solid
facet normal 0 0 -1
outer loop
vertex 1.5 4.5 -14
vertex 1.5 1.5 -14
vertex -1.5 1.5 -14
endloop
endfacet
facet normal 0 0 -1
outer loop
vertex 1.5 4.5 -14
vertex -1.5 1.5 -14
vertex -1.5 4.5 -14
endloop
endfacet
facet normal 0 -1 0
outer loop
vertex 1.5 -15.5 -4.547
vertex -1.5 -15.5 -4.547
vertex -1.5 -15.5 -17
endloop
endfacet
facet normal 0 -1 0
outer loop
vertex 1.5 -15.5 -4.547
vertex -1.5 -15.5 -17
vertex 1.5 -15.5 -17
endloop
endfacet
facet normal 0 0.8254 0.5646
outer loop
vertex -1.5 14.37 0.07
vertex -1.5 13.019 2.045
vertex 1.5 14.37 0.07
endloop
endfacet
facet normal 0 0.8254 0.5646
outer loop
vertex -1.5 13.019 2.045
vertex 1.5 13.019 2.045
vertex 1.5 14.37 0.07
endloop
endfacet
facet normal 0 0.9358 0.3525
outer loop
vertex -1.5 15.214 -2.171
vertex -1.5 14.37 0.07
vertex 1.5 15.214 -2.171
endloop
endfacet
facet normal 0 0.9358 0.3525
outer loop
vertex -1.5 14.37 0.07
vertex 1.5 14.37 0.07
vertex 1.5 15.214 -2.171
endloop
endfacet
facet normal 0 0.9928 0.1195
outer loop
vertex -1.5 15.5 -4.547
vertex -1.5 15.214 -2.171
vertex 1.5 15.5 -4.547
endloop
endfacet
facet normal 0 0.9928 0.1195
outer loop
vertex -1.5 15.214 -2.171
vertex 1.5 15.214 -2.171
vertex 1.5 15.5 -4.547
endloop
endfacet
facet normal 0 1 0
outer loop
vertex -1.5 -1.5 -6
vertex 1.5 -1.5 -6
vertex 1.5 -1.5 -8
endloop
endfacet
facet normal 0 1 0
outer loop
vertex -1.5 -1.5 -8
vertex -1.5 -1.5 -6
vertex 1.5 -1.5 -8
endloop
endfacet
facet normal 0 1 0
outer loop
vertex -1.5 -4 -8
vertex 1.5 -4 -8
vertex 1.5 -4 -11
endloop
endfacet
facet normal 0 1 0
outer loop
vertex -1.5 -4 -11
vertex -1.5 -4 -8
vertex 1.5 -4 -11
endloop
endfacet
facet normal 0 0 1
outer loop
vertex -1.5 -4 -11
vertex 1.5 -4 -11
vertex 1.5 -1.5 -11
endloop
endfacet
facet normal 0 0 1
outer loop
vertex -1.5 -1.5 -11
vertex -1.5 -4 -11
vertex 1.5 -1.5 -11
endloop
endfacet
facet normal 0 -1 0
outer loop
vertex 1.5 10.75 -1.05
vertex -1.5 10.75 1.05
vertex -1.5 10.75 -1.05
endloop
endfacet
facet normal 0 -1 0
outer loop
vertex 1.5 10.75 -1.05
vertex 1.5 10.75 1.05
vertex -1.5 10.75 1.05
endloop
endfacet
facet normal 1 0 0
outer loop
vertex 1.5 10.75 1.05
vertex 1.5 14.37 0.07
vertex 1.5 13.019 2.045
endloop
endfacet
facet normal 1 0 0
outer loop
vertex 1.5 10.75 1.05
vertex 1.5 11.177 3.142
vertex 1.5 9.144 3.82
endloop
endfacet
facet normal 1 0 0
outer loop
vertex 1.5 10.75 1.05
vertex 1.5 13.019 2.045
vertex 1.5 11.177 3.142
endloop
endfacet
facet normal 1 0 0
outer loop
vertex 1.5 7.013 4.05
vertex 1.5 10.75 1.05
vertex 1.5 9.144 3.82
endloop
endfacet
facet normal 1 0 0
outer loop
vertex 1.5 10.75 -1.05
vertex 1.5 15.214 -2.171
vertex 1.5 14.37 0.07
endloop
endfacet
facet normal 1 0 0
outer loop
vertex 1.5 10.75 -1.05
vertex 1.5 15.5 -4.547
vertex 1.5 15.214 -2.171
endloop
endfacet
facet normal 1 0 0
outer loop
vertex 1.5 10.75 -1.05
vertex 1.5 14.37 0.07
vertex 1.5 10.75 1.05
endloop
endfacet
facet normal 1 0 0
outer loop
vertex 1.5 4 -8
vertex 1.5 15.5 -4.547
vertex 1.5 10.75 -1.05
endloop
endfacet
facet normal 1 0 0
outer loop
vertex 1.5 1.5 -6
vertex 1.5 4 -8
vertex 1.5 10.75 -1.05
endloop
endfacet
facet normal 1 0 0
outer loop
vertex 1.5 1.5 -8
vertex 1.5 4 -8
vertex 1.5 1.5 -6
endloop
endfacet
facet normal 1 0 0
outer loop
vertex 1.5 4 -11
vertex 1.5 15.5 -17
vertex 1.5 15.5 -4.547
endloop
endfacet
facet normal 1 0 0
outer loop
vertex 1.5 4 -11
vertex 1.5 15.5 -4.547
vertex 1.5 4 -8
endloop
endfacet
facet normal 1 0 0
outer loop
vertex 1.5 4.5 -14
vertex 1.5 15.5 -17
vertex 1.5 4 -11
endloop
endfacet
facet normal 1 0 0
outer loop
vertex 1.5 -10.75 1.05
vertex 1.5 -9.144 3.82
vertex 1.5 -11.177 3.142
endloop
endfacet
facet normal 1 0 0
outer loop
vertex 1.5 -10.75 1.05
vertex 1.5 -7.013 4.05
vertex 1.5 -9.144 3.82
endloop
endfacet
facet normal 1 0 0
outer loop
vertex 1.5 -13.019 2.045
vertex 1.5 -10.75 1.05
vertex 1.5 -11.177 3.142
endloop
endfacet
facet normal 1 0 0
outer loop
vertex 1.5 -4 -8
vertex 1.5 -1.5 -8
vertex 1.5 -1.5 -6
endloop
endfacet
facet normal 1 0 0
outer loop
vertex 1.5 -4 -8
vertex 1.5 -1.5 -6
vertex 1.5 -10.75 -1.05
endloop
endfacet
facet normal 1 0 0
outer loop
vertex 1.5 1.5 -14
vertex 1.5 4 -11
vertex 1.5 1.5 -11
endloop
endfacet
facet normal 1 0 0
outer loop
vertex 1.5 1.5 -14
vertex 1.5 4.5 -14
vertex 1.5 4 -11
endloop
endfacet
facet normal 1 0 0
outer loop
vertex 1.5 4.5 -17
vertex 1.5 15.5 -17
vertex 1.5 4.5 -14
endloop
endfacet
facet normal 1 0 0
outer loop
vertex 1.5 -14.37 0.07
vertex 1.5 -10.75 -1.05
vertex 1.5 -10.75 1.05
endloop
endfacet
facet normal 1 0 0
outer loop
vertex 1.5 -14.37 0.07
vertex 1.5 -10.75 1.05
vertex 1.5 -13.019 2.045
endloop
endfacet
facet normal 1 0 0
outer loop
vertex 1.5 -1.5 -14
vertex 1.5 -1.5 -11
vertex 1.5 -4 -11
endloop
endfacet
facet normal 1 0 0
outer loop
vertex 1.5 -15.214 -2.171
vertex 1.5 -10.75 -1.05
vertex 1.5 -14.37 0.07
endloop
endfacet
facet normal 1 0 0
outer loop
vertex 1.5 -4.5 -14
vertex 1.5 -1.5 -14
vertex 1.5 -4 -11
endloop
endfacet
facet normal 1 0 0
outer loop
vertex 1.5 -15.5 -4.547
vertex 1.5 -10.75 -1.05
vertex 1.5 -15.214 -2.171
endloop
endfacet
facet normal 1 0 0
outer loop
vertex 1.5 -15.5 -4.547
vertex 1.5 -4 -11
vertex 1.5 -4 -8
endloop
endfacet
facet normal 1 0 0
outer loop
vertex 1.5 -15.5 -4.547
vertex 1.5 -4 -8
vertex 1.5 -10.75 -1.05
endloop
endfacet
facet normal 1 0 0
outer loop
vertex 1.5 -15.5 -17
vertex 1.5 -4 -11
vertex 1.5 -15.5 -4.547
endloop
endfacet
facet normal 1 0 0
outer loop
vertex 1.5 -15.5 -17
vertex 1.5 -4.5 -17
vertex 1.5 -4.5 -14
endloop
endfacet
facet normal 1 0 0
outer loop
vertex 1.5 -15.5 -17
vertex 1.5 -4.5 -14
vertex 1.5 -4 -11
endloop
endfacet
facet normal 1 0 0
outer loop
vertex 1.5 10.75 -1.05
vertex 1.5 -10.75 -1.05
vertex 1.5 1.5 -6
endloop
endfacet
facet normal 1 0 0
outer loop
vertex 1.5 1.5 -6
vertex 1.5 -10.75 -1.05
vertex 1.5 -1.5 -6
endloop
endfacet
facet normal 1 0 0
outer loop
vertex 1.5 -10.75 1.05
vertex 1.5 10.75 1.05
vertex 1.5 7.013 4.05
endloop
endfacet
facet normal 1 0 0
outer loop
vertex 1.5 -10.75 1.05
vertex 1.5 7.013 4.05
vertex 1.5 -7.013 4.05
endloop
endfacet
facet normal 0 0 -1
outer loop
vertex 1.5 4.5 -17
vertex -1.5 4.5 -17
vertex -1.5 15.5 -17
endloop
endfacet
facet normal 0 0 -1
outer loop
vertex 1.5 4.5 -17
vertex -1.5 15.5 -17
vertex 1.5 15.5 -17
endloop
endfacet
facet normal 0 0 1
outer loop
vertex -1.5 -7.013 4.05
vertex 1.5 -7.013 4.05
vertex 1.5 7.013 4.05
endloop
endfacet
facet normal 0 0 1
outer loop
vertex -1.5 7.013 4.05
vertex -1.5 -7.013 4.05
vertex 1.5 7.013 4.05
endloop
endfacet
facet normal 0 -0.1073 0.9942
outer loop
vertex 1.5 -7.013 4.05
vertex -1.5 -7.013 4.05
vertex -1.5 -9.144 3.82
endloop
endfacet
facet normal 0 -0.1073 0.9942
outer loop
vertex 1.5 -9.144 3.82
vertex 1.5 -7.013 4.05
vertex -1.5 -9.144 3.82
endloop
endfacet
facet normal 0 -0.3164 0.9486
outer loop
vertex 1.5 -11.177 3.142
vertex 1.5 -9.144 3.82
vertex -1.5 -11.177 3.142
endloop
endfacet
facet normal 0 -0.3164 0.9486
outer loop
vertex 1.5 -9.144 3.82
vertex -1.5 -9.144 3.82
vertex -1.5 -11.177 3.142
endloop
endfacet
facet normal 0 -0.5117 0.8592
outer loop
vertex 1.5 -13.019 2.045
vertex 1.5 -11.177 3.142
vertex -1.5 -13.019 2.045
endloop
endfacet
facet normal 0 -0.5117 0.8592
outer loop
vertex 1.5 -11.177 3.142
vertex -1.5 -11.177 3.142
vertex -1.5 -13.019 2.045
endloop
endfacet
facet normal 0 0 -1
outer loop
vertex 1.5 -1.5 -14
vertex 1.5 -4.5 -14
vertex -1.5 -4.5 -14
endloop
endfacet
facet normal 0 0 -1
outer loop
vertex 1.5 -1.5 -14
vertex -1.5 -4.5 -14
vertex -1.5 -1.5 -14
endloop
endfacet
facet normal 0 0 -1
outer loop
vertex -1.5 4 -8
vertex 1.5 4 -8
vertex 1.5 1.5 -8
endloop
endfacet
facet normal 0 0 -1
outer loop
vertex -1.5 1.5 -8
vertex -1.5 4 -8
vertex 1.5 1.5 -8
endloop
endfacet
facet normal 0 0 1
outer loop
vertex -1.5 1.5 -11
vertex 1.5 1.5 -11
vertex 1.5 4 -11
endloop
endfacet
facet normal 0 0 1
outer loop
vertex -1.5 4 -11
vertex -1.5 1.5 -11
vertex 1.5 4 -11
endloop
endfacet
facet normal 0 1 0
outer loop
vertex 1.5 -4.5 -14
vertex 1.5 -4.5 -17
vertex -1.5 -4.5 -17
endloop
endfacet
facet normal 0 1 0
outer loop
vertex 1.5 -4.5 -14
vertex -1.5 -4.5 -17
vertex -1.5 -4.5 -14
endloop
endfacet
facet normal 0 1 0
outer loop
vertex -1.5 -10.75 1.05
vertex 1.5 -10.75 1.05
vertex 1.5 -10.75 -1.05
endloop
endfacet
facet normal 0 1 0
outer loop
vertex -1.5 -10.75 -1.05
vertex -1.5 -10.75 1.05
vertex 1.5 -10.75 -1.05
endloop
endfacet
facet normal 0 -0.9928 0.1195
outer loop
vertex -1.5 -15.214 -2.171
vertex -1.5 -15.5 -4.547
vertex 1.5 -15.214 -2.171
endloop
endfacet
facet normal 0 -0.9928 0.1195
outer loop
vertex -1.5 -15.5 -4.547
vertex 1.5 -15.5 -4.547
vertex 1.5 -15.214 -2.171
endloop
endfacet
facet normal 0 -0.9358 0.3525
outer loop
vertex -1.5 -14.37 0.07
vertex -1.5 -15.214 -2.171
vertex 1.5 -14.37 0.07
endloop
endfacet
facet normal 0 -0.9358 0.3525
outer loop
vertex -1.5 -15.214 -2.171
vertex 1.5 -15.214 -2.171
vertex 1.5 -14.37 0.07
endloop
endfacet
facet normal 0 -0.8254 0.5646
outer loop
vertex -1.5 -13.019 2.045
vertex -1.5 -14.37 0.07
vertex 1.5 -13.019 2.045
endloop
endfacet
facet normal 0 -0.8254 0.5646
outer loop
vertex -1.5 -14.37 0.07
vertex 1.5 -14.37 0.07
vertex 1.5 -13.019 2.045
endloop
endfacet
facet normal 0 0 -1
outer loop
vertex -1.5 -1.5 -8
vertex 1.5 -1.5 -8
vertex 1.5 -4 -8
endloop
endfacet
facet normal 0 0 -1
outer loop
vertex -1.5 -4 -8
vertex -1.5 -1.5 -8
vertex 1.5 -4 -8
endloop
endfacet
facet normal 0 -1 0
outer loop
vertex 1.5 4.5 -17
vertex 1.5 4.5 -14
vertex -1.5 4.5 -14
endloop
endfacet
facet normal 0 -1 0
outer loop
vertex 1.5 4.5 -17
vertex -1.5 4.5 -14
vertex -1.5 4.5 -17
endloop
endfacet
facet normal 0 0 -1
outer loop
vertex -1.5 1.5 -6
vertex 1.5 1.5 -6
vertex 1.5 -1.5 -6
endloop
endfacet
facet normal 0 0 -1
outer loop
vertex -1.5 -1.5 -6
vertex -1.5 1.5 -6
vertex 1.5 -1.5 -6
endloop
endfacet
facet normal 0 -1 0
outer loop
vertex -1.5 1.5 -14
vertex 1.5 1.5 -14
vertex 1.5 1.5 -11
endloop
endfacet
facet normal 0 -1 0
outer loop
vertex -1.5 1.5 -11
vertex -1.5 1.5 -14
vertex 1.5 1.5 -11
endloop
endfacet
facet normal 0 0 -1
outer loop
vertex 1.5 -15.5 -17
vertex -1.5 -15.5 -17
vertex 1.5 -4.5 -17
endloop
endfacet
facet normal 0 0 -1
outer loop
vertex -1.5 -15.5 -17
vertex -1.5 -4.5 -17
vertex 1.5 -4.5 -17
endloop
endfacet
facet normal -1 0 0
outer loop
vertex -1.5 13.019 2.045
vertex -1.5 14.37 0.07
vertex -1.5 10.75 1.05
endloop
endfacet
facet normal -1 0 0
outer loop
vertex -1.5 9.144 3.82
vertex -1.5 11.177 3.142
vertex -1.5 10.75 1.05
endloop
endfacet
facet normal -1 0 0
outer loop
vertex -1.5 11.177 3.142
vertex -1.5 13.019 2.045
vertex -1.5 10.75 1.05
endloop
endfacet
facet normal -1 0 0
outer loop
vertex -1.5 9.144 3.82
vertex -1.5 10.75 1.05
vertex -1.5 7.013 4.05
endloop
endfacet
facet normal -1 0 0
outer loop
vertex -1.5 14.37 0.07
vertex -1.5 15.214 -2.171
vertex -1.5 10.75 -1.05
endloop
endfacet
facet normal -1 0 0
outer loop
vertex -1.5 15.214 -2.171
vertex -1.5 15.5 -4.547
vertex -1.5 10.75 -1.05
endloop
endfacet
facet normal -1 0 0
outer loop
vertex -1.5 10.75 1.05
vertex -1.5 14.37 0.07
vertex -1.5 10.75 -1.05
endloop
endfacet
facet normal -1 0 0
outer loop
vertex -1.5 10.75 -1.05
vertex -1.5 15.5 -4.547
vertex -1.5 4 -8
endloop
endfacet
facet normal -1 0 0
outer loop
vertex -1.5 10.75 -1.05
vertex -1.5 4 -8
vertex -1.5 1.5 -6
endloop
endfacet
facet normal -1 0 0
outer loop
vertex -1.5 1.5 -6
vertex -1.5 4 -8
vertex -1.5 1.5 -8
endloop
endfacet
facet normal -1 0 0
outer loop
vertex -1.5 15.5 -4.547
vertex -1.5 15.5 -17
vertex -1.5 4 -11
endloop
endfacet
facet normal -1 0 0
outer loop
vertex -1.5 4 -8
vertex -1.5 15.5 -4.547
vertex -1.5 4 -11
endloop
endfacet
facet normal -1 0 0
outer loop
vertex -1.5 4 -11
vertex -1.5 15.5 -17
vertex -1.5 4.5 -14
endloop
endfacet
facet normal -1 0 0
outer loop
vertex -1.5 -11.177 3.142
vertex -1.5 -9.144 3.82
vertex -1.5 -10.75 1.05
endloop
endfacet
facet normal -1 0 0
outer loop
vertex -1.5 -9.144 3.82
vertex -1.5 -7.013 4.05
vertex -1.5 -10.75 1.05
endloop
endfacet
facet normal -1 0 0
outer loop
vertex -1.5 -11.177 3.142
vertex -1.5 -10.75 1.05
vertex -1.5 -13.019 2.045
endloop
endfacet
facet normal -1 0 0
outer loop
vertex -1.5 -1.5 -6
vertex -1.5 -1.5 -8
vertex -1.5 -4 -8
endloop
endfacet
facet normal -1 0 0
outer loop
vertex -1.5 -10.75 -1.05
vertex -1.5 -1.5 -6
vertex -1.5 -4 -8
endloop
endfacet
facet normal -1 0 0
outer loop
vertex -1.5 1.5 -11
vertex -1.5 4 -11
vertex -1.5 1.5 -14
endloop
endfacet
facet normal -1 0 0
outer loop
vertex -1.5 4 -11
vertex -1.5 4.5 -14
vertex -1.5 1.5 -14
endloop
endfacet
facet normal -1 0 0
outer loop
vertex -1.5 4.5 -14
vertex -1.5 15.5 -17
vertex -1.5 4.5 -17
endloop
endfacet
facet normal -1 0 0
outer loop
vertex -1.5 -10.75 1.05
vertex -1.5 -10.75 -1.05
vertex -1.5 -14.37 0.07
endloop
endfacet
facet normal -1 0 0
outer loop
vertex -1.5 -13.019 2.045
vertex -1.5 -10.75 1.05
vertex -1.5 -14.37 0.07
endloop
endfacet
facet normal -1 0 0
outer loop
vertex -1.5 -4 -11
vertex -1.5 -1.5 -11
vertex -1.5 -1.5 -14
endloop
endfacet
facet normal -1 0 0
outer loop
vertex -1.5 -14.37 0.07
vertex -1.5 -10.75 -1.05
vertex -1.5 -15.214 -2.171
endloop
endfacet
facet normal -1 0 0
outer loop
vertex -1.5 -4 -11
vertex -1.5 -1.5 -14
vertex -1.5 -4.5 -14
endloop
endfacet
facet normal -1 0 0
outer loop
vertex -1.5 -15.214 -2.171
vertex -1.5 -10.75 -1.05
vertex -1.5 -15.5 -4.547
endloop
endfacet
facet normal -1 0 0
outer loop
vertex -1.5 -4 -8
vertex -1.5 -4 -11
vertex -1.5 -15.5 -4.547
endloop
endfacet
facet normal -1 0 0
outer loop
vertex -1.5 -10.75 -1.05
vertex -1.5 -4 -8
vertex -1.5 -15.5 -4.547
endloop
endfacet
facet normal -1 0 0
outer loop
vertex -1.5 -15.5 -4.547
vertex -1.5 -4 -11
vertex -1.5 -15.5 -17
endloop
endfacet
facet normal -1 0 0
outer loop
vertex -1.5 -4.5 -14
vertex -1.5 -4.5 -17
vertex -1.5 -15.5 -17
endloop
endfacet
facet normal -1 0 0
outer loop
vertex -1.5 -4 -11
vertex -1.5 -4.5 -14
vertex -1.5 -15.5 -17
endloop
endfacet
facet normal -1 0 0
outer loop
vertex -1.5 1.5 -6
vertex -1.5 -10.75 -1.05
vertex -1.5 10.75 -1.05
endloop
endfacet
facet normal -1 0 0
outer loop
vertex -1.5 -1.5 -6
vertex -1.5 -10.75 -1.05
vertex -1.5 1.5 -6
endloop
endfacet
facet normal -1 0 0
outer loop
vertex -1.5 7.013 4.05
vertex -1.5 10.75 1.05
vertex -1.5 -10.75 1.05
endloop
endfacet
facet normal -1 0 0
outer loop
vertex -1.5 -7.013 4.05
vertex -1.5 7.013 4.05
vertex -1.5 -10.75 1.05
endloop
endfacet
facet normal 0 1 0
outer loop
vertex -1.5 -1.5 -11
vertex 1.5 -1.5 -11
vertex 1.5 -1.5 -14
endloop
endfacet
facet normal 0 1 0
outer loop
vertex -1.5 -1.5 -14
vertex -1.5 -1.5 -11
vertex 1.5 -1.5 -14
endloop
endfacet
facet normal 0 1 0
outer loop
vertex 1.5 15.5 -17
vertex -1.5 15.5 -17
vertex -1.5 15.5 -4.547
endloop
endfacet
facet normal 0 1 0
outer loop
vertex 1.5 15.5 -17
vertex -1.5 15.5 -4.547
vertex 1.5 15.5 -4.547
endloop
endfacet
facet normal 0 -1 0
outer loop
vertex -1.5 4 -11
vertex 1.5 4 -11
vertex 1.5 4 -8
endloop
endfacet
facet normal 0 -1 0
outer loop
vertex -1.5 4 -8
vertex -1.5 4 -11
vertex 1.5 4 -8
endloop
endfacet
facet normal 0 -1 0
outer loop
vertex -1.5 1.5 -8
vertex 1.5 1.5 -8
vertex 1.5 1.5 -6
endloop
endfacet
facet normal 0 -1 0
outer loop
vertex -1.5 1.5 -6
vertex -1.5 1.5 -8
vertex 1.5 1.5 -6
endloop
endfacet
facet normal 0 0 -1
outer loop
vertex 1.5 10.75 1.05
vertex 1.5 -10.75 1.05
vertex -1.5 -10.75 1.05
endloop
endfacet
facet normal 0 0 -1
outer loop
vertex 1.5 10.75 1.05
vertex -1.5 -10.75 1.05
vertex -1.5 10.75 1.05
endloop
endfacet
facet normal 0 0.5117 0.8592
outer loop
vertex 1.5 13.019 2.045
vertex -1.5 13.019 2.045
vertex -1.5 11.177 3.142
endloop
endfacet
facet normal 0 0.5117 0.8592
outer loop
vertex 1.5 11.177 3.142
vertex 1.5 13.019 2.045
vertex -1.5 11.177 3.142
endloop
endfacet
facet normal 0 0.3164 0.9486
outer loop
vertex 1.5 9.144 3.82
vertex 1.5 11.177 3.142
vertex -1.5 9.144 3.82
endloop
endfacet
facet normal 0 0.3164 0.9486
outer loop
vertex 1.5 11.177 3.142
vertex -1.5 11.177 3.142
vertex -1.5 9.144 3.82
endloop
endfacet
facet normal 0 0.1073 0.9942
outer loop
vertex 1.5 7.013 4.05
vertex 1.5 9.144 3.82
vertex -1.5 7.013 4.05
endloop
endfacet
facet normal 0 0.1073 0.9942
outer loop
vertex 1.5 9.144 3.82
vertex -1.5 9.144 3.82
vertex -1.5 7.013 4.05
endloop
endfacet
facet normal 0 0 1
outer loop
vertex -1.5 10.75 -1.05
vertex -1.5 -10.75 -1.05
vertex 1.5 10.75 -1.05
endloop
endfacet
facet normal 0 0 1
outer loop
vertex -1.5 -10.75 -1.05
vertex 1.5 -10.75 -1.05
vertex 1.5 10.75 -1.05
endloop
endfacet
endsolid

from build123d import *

# Parameters (mm, degrees)
CROQUIS1_W              = 2.1
CROQUIS1_H              = 21.5
SALIENTE_EXTRUIR1_DEPTH = 1.5
REDONDEO1_R             = 10
CROQUIS2_W              = 3
CROQUIS2_H              = 17
SALIENTE_EXTRUIR2_DEPTH = 3
CROQUIS3_W              = 3
CROQUIS3_H              = 17
SALIENTE_EXTRUIR3_DEPTH = 3
REDONDEO2_R             = 10
REDONDEO3_R             = 10
CROQUIS5_W              = 21.447905668
CROQUIS5_H              = 38.241159468
CORTAR_EXTRUIR2_DEPTH   = 10
REDONDEO4_R             = 10
CORTAR_EXTRUIR3_DEPTH   = 10


with BuildPart() as part:
    # Croquis1 → Saliente-Extruir1 (new, symmetric)
    with BuildSketch(Plane(origin=(0, 0, 0), x_dir=(0, 0, -1), z_dir=(1, 0, 0))):
        Polygon((14, -12.5), (17, -12.5), (17, -4.5), (14, -4.5), (14, 4.5), (17, 4.5), (17, 12.5), (-10, 12.5), (-10, -12.5), align=None)
        Rectangle(CROQUIS1_W, CROQUIS1_H, mode=Mode.SUBTRACT)
    extrude(amount=SALIENTE_EXTRUIR1_DEPTH, both=True)

    # Redondeo1
    redondeo1_edges = [part.edges().sort_by_distance(p)[0] for p in [
        (0, -12.5, 10),
        (0, 12.5, 10),
    ]]
    fillet(redondeo1_edges, radius=REDONDEO1_R)

    # Croquis2 → Saliente-Extruir2 (add)
    with BuildSketch(Plane(origin=(0, 12.5, 0), x_dir=(1, 0, 0), z_dir=(0, 1, 0))):
        with Locations((0, 8.5)):
            Rectangle(CROQUIS2_W, CROQUIS2_H)
    extrude(amount=SALIENTE_EXTRUIR2_DEPTH)

    # Croquis3 → Saliente-Extruir3 (add)
    with BuildSketch(Plane.XZ.offset(12.5)):
        with Locations((0, -8.5)):
            Rectangle(CROQUIS3_W, CROQUIS3_H)
    extrude(amount=SALIENTE_EXTRUIR3_DEPTH)

    # Redondeo2
    # the kernel refuses this fillet: 10 mm, written as the material it adds along each edge
    with BuildSketch(Plane(origin=(1.5, -12.5, 0), x_dir=(0, -1, 0), z_dir=(-1, 0, 0))) as redondeo2_piece_1:
        with BuildLine():
            CenterArc((8.038461538, 8.637934089), REDONDEO2_R, 205.587990121, 34.157222478)
            Line((-0.980769231, 4.318967044), (-1.161153846, 4.232587704))
            ThreePointArc((-1.161153846, 4.232587704), (-0.443308828, 2.17017369), (-0.2, 0))
            Line((-0.2, 0), (0, -0.2))
            ThreePointArc((0, -0.2), (1.5, -0.2), (2.899230769, -0.172758682))
            Line((2.899230769, -0.172758682), (3, 0))
        make_face()
    extrude(amount=3)
    with BuildSketch(Plane(origin=(1.5, 12.5, 0), x_dir=(0, 1, 0), z_dir=(-1, 0, 0))) as redondeo2_piece_2:
        with BuildLine():
            CenterArc((8.038461538, -8.637934089), REDONDEO2_R, 120.254787401, 34.157222478)
            Line((-0.980769231, -4.318967044), (-1.161153846, -4.232587704))
            ThreePointArc((-1.161153846, -4.232587704), (-0.443308828, -2.17017369), (-0.2, 0))
            Line((-0.2, 0), (0, 0.2))
            ThreePointArc((0, 0.2), (1.5, 0.2), (2.899230769, 0.172758682))
            Line((2.899230769, 0.172758682), (3, 0))
        make_face()
    extrude(amount=3)

    # Redondeo3
    redondeo3_edges = [part.edges().sort_by_distance(p)[0] for p in [
        (0, 15.5, 0),
        (0, -15.5, 0),
    ]]
    fillet(redondeo3_edges, radius=REDONDEO3_R)

    # Croquis5 → Cortar-Extruir2 (cut)
    with BuildSketch(Plane(origin=(1.5, 0, 0), x_dir=(0, 0, -1), z_dir=(1, 0, 0))):
        with Locations((-14.773952834, -0.867042995)):
            Rectangle(CROQUIS5_W, CROQUIS5_H)
    extrude(amount=-CORTAR_EXTRUIR2_DEPTH, mode=Mode.SUBTRACT)

    # Redondeo4
    # the kernel refuses this fillet: 10 mm, written as the material it takes off along each edge
    with BuildSketch(Plane(origin=(-13.099738715, 11.653031847, 4.05), x_dir=(0, 0.5631802476031196, -0.8263340781485954), z_dir=(1, 0, 0))) as redondeo4_piece_1:
        with BuildLine():
            CenterArc((5.650243293, -9.465906235), REDONDEO4_R, 108.810422247, 36.913558107)
            Line((-2.613097489, -3.834103759), (-2.778364304, -3.72146771))
            Line((-2.778364304, -3.72146771), (-0.165266816, 0.11263605))
            Line((-0.165266816, 0.11263605), (0.024258644, 0.198523344))
            ThreePointArc((0.024258644, 0.198523344), (1.212932207, 0.126167209), (2.361376837, 0.189318125))
            Line((2.361376837, 0.189318125), (2.425864415, 0))
        make_face()
    extrude(amount=26.19947743, mode=Mode.SUBTRACT)
    with BuildSketch(Plane(origin=(-13.099738715, -11.653031847, 4.05), x_dir=(0, 1, 0), z_dir=(1, 0, 0))) as redondeo4_piece_2:
        with BuildLine():
            CenterArc((4.639895486, -10), REDONDEO4_R, 90, 36.913558107)
            Line((-1.366198922, -2.004574435), (-1.48632081, -1.844665924))
            ThreePointArc((-1.48632081, -1.844665924), (-0.787355725, -0.931232338), (-0.177708594, 0.091758682))
            Line((-0.177708594, 0.091758682), (0, 0.2))
            Line((0, 0.2), (4.639895486, 0.2))
            Line((4.639895486, 0.2), (4.639895486, 0))
        make_face()
    extrude(amount=26.19947743, mode=Mode.SUBTRACT)

    # Croquis6 → Cortar-Extruir3 (cut)
    with BuildSketch(Plane(origin=(1.5, 0, 0), x_dir=(0, 0, -1), z_dir=(1, 0, 0))):
        Polygon((14, 1.5), (11, 1.5), (11, 4), (8, 4), (8, 1.5), (6, 1.5), (6, -1.5), (8, -1.5), (8, -4), (11, -4), (11, -1.5), (14, -1.5), align=None)
    extrude(amount=-CORTAR_EXTRUIR3_DEPTH, mode=Mode.SUBTRACT)


solid = part.part
